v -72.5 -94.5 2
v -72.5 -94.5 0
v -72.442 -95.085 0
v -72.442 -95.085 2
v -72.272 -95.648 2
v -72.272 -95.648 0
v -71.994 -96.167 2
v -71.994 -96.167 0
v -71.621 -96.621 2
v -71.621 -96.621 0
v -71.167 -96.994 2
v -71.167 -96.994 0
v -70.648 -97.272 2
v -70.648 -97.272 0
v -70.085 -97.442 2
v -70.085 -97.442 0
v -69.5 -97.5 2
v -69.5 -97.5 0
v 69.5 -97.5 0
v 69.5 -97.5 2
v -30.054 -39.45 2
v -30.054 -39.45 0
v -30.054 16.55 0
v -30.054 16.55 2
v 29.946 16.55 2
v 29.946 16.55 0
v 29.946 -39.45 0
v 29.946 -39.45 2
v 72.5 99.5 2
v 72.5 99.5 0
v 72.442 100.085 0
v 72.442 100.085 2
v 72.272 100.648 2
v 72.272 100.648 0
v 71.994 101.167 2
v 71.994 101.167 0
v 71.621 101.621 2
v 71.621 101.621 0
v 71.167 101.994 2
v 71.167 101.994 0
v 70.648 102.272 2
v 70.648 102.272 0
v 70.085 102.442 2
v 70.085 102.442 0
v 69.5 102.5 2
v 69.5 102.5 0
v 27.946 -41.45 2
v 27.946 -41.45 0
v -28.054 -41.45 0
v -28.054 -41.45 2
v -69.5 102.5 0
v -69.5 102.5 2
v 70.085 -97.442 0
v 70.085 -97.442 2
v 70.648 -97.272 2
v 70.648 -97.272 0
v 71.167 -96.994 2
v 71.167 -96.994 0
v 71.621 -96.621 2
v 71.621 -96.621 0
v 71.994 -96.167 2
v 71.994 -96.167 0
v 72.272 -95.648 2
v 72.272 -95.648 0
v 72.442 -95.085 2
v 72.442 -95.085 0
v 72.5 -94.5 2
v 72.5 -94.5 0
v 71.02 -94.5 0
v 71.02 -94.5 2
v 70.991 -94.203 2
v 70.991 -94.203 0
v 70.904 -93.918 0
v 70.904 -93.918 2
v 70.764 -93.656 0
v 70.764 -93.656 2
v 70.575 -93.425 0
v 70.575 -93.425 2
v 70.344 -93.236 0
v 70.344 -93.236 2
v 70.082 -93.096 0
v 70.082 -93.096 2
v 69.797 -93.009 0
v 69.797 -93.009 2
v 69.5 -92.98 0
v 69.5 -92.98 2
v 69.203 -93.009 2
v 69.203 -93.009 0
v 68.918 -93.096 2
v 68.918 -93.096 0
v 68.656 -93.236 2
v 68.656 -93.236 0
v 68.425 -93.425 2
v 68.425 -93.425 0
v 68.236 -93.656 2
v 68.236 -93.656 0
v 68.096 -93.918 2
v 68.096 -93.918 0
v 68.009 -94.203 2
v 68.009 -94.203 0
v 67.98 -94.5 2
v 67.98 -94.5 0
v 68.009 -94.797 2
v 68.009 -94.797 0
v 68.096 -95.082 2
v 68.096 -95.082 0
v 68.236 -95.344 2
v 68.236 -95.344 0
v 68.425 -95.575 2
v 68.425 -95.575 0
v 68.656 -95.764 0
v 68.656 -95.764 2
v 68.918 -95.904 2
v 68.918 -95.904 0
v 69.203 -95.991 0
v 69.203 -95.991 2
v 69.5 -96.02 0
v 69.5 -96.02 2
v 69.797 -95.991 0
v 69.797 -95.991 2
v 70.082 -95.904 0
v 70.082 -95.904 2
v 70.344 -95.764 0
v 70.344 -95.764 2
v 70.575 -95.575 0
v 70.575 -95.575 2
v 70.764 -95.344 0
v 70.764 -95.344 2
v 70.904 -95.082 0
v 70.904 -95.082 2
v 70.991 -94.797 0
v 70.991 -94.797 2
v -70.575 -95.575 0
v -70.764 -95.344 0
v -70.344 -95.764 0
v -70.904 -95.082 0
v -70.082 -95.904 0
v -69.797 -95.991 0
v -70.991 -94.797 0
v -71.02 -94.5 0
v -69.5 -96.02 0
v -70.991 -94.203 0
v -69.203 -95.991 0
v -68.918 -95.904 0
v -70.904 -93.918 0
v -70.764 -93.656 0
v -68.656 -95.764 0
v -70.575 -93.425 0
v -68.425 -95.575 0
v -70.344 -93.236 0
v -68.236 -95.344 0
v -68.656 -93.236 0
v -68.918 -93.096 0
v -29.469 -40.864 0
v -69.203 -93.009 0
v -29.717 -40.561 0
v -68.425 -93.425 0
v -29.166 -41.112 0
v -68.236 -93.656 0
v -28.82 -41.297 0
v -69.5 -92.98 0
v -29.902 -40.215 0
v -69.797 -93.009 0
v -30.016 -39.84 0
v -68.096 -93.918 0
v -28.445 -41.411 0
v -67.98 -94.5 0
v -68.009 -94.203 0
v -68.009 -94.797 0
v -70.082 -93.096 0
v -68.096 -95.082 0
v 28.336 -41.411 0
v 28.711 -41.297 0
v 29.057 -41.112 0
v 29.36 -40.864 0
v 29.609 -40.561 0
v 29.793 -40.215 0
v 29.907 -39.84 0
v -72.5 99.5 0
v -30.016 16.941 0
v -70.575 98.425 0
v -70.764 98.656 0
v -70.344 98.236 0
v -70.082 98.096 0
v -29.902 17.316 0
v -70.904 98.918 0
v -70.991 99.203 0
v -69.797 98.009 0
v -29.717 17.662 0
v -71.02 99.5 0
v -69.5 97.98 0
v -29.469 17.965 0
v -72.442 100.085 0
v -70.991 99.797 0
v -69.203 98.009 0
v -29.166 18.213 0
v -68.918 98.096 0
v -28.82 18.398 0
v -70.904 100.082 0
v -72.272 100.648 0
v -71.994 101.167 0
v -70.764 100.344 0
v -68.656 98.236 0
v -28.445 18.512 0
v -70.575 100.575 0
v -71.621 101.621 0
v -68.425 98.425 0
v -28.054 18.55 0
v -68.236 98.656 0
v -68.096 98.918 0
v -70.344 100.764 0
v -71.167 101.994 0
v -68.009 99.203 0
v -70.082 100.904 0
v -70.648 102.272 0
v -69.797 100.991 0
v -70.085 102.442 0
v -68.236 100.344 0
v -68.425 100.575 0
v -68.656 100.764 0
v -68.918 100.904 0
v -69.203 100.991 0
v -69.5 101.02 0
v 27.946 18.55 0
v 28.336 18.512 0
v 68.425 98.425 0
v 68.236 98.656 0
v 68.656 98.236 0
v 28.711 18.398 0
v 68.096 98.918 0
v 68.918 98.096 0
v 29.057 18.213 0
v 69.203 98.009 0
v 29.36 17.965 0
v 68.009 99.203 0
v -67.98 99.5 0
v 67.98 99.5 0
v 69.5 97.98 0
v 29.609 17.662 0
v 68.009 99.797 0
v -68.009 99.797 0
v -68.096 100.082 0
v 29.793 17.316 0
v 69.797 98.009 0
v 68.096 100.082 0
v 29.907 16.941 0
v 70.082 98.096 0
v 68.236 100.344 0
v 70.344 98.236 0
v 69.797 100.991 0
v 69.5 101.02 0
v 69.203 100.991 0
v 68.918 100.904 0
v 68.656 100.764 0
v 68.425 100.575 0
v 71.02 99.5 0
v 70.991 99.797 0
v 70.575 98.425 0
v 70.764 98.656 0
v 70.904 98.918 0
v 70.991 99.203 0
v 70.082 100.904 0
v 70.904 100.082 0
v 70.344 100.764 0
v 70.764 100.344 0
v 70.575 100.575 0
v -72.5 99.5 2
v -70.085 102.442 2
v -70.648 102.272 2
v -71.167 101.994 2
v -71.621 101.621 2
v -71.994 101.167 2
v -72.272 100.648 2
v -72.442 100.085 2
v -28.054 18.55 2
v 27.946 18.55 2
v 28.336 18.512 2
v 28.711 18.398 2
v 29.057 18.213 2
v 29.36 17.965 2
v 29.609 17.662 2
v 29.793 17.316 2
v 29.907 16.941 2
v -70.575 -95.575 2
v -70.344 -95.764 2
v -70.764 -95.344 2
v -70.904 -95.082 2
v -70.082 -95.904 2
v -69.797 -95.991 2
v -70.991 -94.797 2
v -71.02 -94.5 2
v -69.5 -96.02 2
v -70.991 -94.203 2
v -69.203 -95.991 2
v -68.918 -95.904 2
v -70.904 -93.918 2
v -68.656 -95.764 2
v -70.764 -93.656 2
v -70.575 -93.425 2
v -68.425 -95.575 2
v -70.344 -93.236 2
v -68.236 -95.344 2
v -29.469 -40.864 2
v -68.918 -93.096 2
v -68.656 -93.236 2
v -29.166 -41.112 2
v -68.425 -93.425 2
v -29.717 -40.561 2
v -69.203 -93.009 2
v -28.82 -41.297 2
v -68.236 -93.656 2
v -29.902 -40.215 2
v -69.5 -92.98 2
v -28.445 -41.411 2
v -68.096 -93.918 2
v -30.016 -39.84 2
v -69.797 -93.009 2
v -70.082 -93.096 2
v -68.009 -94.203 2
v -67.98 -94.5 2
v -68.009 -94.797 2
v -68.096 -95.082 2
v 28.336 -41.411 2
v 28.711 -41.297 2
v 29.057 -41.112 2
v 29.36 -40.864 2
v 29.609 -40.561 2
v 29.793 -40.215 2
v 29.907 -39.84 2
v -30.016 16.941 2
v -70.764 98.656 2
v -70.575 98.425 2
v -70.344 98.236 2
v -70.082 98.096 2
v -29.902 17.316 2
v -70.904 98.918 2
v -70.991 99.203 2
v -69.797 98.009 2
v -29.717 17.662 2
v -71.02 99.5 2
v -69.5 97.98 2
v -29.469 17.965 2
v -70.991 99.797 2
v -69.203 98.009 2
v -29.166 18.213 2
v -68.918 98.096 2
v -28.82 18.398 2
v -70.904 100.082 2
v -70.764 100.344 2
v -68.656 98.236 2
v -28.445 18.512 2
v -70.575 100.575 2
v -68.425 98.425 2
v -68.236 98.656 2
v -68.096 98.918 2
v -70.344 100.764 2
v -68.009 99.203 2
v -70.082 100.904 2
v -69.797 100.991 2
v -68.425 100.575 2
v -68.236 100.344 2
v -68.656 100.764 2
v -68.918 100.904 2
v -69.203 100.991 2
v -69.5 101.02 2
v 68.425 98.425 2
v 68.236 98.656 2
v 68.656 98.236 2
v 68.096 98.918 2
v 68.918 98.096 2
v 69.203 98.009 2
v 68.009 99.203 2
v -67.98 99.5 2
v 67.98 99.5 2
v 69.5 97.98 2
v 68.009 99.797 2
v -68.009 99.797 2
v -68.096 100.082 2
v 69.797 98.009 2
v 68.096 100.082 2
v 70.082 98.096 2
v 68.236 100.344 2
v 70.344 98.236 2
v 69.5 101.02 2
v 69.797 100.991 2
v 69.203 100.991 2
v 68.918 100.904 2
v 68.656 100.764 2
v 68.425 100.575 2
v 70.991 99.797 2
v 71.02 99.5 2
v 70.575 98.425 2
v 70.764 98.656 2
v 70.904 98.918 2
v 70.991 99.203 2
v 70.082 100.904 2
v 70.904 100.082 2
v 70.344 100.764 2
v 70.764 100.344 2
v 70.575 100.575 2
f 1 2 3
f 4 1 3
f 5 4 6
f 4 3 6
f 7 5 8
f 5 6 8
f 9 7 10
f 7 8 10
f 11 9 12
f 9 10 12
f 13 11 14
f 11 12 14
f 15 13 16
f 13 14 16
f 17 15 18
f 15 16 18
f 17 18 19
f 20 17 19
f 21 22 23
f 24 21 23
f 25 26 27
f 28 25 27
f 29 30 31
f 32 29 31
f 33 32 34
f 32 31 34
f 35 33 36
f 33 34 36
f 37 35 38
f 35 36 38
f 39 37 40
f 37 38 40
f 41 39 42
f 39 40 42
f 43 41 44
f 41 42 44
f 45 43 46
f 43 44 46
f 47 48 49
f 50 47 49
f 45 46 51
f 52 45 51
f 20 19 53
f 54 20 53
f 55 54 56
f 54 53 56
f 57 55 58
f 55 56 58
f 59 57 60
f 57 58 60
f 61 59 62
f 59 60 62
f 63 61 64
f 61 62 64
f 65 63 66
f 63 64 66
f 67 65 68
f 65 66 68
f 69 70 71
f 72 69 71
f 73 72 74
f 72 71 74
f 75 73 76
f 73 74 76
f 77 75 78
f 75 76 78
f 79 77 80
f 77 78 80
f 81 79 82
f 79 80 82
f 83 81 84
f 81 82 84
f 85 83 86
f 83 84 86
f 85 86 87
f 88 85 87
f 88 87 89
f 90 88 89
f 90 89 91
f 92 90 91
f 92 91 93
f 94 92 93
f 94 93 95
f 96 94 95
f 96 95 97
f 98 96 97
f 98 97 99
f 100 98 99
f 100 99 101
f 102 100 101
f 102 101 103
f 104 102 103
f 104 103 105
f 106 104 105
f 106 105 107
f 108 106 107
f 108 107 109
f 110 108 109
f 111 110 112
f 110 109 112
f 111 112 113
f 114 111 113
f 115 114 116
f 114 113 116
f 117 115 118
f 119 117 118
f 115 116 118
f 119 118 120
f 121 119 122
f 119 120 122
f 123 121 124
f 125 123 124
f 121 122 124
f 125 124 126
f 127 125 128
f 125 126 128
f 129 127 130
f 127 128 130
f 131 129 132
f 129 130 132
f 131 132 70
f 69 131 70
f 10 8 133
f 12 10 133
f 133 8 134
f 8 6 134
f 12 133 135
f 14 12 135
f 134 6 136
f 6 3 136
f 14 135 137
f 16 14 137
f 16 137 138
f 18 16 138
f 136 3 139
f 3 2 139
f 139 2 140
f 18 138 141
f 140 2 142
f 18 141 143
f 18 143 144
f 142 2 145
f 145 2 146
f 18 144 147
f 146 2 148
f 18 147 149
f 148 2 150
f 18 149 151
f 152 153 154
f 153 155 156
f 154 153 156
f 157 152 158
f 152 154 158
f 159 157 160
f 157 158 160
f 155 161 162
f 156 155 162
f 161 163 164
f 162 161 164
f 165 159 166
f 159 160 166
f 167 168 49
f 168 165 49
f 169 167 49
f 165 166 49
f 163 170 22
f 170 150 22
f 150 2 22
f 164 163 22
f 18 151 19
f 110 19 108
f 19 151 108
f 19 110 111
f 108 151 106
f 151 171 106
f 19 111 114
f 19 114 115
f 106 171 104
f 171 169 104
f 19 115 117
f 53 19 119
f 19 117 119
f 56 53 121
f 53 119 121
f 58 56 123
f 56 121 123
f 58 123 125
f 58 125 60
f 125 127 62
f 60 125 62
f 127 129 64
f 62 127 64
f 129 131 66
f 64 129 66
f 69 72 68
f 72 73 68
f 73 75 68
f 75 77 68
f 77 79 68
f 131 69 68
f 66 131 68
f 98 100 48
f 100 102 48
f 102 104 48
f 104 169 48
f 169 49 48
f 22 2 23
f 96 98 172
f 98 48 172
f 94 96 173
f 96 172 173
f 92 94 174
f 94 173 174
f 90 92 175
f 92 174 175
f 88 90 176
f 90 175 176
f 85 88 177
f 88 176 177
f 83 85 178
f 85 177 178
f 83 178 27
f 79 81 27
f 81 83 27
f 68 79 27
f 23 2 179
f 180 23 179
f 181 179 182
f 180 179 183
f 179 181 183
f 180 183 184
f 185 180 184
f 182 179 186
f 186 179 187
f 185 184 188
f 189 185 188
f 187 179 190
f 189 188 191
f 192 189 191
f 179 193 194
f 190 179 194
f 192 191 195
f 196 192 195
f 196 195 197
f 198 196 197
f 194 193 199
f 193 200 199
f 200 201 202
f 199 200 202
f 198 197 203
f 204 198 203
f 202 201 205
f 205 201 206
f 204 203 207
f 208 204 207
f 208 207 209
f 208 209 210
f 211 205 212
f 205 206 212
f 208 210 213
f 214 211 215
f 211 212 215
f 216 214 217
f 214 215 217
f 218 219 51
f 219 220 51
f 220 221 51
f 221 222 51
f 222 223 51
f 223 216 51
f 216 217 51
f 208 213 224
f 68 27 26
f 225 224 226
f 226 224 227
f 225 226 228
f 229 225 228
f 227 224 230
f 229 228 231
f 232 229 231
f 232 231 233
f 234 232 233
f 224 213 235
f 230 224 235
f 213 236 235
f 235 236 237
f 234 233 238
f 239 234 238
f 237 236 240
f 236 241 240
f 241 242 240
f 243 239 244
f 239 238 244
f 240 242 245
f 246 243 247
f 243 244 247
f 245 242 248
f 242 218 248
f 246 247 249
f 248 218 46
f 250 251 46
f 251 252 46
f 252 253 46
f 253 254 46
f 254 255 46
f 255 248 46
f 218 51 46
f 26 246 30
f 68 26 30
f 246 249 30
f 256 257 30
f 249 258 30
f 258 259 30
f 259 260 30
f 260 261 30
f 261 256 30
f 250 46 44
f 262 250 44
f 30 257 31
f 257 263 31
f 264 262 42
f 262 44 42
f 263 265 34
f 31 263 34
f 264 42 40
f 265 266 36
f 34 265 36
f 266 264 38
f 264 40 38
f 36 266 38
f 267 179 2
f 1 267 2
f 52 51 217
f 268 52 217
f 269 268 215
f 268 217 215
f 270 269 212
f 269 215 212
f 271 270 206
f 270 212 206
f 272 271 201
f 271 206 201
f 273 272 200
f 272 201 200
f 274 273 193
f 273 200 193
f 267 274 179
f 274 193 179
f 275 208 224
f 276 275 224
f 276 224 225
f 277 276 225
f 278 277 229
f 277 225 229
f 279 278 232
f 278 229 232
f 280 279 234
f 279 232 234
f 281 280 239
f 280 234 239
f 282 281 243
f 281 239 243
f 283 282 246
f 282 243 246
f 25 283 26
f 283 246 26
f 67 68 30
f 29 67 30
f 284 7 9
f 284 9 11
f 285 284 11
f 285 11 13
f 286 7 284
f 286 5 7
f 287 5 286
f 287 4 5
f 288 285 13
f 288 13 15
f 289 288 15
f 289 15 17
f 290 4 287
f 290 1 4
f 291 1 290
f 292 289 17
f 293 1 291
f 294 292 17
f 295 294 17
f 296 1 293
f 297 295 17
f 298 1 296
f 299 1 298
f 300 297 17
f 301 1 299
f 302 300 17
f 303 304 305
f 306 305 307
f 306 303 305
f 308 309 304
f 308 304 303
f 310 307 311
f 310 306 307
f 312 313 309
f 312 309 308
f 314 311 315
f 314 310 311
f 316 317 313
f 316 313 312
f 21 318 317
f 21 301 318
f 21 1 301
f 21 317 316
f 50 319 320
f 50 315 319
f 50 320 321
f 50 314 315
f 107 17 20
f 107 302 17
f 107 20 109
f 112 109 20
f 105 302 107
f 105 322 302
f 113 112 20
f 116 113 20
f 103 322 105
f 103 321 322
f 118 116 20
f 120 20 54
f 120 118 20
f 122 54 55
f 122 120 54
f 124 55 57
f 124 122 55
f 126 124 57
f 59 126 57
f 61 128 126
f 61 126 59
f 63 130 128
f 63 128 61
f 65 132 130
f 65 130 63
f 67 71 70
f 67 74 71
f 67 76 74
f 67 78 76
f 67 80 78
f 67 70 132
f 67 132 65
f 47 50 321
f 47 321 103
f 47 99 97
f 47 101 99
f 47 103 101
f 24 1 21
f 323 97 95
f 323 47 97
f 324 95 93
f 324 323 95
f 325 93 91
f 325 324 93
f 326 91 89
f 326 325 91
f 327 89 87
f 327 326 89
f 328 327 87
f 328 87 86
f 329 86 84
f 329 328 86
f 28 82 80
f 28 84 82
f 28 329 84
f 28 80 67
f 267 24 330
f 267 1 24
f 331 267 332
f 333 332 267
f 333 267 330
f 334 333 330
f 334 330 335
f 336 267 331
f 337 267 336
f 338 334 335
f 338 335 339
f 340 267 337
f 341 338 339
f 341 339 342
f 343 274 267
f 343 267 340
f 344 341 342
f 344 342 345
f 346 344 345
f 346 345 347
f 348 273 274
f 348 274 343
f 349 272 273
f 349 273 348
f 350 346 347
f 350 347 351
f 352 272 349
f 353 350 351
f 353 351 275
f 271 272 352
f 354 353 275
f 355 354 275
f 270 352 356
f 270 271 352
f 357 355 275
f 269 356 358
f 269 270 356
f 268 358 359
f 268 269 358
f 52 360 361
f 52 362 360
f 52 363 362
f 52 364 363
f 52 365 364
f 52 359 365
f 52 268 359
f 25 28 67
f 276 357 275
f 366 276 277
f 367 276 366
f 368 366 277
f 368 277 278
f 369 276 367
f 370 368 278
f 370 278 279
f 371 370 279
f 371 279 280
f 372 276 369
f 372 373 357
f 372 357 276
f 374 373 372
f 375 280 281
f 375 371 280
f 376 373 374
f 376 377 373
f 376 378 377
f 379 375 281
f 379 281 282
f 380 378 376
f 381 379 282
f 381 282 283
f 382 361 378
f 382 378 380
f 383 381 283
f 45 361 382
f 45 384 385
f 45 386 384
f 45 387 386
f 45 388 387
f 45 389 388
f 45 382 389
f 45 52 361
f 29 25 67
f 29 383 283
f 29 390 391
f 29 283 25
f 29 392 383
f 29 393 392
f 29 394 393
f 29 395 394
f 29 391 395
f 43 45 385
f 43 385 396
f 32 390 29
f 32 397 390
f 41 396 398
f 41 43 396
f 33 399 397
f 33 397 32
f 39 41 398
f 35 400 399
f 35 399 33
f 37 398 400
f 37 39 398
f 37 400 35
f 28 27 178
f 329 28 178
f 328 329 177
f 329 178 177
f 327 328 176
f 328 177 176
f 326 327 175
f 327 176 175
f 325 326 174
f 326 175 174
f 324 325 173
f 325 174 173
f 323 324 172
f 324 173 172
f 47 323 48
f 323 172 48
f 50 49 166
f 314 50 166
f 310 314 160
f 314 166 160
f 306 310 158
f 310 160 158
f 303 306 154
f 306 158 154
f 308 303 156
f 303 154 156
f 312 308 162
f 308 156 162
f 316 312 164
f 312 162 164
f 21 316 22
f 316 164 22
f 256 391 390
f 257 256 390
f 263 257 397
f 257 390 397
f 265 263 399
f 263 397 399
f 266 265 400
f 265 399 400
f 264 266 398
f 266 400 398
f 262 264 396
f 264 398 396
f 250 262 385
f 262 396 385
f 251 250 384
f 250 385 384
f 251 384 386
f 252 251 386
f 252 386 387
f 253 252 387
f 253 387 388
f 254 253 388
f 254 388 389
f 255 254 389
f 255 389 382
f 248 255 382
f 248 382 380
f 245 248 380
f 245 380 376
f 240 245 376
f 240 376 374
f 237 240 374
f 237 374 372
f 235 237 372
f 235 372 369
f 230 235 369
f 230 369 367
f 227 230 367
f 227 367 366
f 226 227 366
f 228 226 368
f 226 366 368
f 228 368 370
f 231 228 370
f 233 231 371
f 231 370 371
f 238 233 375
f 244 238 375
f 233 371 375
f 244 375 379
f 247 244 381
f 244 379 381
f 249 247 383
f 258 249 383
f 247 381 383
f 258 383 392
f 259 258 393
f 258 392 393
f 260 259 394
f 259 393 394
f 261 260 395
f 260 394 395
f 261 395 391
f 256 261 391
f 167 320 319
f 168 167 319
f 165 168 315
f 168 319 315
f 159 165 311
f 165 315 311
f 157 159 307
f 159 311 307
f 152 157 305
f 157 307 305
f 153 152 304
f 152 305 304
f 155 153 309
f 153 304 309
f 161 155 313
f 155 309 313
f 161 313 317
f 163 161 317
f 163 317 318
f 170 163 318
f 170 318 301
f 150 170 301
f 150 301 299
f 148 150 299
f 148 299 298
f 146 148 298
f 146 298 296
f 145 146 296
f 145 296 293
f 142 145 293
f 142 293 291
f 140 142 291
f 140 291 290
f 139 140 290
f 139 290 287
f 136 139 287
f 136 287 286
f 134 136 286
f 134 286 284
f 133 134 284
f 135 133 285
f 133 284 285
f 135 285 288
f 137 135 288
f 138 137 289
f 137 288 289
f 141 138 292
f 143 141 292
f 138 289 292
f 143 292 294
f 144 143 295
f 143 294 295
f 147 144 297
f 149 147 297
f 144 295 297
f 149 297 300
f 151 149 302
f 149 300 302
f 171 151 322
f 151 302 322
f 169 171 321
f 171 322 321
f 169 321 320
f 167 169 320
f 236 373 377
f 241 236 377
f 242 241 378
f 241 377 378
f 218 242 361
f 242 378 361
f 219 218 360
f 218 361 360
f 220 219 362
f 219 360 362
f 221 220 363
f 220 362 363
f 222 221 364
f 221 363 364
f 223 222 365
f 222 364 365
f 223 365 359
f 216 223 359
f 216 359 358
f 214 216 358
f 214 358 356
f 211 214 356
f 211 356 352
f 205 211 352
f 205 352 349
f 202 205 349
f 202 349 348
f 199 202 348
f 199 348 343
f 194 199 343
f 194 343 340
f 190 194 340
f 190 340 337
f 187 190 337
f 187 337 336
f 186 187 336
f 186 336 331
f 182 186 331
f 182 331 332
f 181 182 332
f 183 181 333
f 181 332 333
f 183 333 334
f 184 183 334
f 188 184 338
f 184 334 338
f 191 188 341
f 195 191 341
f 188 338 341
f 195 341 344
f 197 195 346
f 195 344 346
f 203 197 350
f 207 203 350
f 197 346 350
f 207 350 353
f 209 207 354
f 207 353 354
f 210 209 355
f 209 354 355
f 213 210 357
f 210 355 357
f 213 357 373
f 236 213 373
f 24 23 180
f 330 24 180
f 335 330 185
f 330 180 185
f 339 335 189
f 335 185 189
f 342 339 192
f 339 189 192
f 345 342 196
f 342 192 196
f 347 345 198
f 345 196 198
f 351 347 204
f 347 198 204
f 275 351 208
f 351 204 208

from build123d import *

# Parameters (mm, degrees)
BOSS_EXTRU_1_DEPTH      = 2
ENL_V_MAT_EXTRU_1_DEPTH = 10
ESQUISSE3_R             = 1.52
ENL_V_MAT_EXTRU_2_DEPTH = 10


with BuildPart() as part:
    # Esquisse1 → Boss.-Extru.1 (new body)
    with BuildSketch(Plane.XY):
        with BuildLine():
            Line((-69.5, -97.5), (69.5, -97.5))
            ThreePointArc((69.5, -97.5), (71.621320344, -96.621320344), (72.5, -94.5))
            Line((72.5, -94.5), (72.5, 99.5))
            ThreePointArc((72.5, 99.5), (71.621320344, 101.621320344), (69.5, 102.5))
            Line((69.5, 102.5), (-69.5, 102.5))
            ThreePointArc((-69.5, 102.5), (-71.621320344, 101.621320344), (-72.5, 99.5))
            Line((-72.5, 99.5), (-72.5, -94.5))
            ThreePointArc((-72.5, -94.5), (-71.621320344, -96.621320344), (-69.5, -97.5))
        make_face()
    extrude(amount=BOSS_EXTRU_1_DEPTH)

    # Esquisse2 → Enlèv. mat.-Extru.1 (cut)
    with BuildSketch(Plane(origin=(0, 0, 0), x_dir=(-1, 0, 0), z_dir=(0, 0, -1))):
        with BuildLine():
            Line((-27.945607011, -41.449532586), (28.054392989, -41.449532586))
            ThreePointArc((28.054392989, -41.449532586), (29.468606552, -40.863746148), (30.054392989, -39.449532586))
            Line((30.054392989, -39.449532586), (30.054392989, 16.550467414))
            ThreePointArc((30.054392989, 16.550467414), (29.468606552, 17.964680976), (28.054392989, 18.550467414))
            Line((28.054392989, 18.550467414), (-27.945607011, 18.550467414))
            ThreePointArc((-27.945607011, 18.550467414), (-29.359820573, 17.964680976), (-29.945607011, 16.550467414))
            Line((-29.945607011, 16.550467414), (-29.945607011, -39.449532586))
            ThreePointArc((-29.945607011, -39.449532586), (-29.359820573, -40.863746148), (-27.945607011, -41.449532586))
        make_face()
    extrude(amount=-ENL_V_MAT_EXTRU_1_DEPTH, mode=Mode.SUBTRACT)

    # Esquisse3 → Enlèv. mat.-Extru.2 (cut)
    with BuildSketch(Plane.XY.offset(2)):
        with Locations((69.5, 99.5)):
            Circle(ESQUISSE3_R)
        with Locations((-69.5, 99.5)):
            Circle(ESQUISSE3_R)
        with Locations((-69.5, -94.5)):
            Circle(ESQUISSE3_R)
        with Locations((69.5, -94.5)):
            Circle(ESQUISSE3_R)
    extrude(amount=-ENL_V_MAT_EXTRU_2_DEPTH, mode=Mode.SUBTRACT)


solid = part.part
